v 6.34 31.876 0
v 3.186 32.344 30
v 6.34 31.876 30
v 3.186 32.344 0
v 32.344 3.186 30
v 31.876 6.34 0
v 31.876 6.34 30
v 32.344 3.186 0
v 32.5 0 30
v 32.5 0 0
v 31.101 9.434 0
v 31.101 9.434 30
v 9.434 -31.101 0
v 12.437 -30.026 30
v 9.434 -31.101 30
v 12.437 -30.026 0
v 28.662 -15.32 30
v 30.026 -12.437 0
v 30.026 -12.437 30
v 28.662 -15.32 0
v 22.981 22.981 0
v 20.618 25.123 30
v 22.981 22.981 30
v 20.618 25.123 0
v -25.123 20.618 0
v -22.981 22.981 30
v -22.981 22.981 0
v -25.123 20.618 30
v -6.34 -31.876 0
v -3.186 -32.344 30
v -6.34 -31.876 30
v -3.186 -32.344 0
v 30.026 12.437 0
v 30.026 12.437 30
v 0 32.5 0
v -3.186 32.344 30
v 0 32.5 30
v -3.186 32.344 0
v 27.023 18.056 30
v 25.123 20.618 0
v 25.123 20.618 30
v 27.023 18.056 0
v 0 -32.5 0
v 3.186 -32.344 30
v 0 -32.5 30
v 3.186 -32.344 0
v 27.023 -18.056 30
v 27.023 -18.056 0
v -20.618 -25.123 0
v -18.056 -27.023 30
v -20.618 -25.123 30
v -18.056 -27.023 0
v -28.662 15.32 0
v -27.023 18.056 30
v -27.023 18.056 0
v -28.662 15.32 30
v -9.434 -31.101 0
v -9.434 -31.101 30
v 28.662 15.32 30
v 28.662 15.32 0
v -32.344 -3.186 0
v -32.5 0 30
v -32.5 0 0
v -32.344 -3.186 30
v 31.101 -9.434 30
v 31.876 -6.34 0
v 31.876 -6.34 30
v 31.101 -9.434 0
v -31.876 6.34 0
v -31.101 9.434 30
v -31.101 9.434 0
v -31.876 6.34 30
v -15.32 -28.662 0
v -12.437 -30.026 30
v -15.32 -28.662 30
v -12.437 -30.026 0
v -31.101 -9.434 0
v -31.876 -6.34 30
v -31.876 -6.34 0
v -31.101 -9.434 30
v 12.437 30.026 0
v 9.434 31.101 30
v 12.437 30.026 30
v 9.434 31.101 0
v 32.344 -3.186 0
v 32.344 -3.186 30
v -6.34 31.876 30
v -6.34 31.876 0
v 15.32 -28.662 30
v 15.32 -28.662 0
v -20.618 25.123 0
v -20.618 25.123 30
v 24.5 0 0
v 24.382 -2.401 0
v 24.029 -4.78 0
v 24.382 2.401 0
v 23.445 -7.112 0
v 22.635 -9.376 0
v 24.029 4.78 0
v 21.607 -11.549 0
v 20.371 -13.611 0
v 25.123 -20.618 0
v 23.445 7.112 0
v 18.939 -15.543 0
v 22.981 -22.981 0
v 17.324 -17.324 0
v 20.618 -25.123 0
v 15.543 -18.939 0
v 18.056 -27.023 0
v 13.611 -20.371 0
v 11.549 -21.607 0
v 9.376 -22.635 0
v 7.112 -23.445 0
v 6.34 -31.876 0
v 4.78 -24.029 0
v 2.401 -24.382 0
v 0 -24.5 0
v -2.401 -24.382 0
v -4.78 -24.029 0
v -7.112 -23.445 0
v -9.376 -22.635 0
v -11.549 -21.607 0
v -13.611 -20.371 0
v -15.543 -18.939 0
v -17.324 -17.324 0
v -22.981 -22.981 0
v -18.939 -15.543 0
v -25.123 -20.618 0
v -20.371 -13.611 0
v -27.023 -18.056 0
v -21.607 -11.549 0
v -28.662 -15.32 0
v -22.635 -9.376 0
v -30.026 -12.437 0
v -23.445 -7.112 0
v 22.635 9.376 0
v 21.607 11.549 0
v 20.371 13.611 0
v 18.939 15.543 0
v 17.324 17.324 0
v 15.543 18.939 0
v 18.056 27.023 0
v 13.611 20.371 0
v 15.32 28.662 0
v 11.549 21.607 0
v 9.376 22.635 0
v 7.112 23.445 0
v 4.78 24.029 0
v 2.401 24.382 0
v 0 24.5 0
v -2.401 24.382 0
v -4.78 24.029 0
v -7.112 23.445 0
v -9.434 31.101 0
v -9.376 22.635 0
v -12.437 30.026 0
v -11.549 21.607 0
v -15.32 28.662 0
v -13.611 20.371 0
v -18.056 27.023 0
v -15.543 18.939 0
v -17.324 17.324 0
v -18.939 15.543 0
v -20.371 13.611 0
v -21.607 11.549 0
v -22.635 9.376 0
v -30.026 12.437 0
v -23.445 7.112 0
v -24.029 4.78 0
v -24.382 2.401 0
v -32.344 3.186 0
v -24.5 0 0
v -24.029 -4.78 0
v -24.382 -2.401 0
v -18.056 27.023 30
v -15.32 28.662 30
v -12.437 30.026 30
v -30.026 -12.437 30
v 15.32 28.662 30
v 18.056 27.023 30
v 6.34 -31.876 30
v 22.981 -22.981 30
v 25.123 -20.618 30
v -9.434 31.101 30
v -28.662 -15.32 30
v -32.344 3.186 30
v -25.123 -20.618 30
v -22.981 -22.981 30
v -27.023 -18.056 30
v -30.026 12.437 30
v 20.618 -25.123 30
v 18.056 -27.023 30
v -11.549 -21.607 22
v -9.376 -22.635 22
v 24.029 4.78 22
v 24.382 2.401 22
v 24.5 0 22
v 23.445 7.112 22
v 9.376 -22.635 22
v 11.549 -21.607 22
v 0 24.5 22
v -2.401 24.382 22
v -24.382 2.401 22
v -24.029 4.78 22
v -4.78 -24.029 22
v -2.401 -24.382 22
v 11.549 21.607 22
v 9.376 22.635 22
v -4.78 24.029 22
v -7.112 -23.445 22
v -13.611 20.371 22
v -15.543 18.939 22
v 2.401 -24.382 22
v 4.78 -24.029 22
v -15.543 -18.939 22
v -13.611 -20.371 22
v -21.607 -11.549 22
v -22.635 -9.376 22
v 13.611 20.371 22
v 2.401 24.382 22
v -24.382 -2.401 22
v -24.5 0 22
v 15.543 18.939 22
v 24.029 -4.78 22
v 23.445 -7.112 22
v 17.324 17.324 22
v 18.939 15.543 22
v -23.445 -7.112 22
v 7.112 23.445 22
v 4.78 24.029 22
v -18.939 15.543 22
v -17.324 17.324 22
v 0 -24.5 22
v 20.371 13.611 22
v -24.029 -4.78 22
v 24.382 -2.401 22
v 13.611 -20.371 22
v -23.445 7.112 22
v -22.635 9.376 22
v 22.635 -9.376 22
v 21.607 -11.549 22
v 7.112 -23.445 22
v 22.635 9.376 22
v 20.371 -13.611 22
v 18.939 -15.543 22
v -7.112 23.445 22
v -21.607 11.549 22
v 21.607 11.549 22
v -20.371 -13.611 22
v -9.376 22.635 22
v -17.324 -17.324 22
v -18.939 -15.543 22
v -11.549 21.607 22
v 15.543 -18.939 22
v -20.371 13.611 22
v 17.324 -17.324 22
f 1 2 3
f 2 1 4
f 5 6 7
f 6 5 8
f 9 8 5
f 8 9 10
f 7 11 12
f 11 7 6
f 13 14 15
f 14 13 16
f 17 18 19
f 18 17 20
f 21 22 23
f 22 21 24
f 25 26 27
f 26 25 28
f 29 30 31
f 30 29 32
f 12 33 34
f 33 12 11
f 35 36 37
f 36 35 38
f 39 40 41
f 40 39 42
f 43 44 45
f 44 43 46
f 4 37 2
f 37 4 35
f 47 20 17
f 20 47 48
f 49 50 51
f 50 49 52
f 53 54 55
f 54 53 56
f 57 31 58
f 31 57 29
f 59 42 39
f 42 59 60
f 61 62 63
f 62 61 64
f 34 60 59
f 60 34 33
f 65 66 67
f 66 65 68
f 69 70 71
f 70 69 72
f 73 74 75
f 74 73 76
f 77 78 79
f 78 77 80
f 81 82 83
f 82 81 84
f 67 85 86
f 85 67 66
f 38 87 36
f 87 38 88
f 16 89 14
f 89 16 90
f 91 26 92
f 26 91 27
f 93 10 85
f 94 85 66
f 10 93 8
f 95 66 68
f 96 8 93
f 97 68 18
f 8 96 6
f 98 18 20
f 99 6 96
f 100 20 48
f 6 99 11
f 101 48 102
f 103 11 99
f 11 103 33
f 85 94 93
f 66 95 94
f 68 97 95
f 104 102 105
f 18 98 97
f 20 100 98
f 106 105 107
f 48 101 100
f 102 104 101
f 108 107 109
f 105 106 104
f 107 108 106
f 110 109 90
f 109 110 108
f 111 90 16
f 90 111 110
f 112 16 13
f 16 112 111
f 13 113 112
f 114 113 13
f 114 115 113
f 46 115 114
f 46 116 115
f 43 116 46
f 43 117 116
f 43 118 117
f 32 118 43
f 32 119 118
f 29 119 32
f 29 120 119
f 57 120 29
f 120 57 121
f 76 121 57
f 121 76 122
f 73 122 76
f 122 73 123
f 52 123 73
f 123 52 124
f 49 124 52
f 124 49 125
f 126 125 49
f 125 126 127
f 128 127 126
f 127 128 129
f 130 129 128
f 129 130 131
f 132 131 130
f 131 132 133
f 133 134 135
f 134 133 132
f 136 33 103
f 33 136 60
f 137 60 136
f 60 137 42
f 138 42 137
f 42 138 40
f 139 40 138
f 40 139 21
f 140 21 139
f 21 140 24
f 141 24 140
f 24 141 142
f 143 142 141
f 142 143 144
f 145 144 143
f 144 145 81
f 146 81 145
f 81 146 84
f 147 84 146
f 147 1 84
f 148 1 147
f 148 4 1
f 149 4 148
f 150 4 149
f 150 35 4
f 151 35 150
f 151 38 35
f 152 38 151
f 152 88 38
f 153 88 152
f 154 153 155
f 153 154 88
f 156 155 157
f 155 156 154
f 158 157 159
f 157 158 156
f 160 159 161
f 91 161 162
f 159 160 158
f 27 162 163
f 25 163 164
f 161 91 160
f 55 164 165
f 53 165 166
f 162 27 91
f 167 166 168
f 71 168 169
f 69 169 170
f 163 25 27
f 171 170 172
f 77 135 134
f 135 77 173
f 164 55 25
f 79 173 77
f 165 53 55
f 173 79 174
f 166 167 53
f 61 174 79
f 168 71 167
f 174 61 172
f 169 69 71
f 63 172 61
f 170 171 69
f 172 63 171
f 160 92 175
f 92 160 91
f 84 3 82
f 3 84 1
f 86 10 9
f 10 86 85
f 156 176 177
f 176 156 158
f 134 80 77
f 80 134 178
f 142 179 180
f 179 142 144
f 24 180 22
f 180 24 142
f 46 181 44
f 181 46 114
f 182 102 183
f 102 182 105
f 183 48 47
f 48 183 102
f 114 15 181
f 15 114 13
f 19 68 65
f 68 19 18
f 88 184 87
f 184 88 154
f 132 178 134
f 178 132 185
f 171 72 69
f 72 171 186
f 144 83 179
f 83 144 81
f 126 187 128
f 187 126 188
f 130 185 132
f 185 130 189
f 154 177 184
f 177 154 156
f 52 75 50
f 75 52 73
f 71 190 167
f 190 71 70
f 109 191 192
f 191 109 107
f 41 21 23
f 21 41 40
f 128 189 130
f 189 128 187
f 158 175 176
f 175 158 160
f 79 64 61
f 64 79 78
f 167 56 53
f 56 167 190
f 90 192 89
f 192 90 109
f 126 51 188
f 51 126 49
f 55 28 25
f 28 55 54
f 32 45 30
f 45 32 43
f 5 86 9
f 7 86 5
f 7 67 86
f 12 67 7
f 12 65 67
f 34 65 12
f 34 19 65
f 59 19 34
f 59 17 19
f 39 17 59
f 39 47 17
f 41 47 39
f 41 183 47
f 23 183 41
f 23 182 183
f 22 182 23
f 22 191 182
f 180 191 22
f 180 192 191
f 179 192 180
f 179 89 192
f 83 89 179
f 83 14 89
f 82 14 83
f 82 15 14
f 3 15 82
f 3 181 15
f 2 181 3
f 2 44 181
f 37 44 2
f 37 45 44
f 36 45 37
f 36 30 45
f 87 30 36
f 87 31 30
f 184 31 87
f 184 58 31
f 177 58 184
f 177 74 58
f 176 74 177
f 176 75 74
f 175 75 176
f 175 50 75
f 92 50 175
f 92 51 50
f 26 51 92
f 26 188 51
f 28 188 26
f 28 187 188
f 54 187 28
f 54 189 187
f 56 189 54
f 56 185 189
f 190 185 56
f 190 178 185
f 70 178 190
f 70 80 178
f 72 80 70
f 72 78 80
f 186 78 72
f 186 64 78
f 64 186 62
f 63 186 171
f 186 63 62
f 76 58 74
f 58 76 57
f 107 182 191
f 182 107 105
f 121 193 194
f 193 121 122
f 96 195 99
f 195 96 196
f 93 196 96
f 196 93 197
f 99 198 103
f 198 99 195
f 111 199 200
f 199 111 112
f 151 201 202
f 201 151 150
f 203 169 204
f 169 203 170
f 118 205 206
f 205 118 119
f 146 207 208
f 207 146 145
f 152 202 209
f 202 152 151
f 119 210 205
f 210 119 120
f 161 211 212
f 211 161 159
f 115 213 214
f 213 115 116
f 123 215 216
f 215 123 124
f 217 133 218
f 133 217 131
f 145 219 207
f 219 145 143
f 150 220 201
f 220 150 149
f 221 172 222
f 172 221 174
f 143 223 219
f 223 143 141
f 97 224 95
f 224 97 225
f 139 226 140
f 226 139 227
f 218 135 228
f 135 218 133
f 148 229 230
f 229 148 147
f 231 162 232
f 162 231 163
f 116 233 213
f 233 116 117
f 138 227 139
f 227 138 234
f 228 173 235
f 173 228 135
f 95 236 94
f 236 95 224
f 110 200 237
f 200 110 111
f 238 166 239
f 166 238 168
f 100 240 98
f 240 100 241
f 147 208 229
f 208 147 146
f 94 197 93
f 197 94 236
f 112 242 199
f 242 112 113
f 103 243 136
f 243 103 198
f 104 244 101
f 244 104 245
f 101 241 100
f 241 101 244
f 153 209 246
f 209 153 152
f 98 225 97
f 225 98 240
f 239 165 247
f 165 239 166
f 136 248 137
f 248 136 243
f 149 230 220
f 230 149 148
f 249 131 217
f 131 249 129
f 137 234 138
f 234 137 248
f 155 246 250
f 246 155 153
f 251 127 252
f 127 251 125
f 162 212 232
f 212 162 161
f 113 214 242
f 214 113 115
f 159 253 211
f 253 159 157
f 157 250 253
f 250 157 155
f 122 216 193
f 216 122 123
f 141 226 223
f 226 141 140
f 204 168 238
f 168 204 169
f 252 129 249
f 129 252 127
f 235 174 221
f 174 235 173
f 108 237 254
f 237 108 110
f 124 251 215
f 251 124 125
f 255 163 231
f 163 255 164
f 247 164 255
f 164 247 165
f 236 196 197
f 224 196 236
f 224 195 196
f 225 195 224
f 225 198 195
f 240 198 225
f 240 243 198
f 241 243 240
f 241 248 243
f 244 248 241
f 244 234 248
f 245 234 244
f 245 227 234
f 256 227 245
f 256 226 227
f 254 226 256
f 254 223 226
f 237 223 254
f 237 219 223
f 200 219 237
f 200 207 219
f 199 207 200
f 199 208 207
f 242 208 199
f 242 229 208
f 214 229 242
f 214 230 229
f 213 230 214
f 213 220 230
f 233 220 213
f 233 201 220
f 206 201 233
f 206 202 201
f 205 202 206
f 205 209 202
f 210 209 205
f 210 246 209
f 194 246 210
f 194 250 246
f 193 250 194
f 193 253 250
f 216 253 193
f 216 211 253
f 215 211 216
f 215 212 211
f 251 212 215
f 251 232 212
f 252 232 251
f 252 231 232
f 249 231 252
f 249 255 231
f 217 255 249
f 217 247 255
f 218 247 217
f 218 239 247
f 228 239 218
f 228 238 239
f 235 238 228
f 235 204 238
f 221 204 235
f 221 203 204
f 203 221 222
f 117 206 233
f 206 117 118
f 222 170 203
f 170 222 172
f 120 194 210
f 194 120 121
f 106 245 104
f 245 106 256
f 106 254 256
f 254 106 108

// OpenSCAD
module disc_cover(width=65, height=30, thickness=8) {
    difference() {
        cylinder(d=width, h=height);
        translate([0,0,-1])
            cylinder(d=width-2*thickness, h=height-thickness+1);
    };
}

disc_cover($fn=64);
